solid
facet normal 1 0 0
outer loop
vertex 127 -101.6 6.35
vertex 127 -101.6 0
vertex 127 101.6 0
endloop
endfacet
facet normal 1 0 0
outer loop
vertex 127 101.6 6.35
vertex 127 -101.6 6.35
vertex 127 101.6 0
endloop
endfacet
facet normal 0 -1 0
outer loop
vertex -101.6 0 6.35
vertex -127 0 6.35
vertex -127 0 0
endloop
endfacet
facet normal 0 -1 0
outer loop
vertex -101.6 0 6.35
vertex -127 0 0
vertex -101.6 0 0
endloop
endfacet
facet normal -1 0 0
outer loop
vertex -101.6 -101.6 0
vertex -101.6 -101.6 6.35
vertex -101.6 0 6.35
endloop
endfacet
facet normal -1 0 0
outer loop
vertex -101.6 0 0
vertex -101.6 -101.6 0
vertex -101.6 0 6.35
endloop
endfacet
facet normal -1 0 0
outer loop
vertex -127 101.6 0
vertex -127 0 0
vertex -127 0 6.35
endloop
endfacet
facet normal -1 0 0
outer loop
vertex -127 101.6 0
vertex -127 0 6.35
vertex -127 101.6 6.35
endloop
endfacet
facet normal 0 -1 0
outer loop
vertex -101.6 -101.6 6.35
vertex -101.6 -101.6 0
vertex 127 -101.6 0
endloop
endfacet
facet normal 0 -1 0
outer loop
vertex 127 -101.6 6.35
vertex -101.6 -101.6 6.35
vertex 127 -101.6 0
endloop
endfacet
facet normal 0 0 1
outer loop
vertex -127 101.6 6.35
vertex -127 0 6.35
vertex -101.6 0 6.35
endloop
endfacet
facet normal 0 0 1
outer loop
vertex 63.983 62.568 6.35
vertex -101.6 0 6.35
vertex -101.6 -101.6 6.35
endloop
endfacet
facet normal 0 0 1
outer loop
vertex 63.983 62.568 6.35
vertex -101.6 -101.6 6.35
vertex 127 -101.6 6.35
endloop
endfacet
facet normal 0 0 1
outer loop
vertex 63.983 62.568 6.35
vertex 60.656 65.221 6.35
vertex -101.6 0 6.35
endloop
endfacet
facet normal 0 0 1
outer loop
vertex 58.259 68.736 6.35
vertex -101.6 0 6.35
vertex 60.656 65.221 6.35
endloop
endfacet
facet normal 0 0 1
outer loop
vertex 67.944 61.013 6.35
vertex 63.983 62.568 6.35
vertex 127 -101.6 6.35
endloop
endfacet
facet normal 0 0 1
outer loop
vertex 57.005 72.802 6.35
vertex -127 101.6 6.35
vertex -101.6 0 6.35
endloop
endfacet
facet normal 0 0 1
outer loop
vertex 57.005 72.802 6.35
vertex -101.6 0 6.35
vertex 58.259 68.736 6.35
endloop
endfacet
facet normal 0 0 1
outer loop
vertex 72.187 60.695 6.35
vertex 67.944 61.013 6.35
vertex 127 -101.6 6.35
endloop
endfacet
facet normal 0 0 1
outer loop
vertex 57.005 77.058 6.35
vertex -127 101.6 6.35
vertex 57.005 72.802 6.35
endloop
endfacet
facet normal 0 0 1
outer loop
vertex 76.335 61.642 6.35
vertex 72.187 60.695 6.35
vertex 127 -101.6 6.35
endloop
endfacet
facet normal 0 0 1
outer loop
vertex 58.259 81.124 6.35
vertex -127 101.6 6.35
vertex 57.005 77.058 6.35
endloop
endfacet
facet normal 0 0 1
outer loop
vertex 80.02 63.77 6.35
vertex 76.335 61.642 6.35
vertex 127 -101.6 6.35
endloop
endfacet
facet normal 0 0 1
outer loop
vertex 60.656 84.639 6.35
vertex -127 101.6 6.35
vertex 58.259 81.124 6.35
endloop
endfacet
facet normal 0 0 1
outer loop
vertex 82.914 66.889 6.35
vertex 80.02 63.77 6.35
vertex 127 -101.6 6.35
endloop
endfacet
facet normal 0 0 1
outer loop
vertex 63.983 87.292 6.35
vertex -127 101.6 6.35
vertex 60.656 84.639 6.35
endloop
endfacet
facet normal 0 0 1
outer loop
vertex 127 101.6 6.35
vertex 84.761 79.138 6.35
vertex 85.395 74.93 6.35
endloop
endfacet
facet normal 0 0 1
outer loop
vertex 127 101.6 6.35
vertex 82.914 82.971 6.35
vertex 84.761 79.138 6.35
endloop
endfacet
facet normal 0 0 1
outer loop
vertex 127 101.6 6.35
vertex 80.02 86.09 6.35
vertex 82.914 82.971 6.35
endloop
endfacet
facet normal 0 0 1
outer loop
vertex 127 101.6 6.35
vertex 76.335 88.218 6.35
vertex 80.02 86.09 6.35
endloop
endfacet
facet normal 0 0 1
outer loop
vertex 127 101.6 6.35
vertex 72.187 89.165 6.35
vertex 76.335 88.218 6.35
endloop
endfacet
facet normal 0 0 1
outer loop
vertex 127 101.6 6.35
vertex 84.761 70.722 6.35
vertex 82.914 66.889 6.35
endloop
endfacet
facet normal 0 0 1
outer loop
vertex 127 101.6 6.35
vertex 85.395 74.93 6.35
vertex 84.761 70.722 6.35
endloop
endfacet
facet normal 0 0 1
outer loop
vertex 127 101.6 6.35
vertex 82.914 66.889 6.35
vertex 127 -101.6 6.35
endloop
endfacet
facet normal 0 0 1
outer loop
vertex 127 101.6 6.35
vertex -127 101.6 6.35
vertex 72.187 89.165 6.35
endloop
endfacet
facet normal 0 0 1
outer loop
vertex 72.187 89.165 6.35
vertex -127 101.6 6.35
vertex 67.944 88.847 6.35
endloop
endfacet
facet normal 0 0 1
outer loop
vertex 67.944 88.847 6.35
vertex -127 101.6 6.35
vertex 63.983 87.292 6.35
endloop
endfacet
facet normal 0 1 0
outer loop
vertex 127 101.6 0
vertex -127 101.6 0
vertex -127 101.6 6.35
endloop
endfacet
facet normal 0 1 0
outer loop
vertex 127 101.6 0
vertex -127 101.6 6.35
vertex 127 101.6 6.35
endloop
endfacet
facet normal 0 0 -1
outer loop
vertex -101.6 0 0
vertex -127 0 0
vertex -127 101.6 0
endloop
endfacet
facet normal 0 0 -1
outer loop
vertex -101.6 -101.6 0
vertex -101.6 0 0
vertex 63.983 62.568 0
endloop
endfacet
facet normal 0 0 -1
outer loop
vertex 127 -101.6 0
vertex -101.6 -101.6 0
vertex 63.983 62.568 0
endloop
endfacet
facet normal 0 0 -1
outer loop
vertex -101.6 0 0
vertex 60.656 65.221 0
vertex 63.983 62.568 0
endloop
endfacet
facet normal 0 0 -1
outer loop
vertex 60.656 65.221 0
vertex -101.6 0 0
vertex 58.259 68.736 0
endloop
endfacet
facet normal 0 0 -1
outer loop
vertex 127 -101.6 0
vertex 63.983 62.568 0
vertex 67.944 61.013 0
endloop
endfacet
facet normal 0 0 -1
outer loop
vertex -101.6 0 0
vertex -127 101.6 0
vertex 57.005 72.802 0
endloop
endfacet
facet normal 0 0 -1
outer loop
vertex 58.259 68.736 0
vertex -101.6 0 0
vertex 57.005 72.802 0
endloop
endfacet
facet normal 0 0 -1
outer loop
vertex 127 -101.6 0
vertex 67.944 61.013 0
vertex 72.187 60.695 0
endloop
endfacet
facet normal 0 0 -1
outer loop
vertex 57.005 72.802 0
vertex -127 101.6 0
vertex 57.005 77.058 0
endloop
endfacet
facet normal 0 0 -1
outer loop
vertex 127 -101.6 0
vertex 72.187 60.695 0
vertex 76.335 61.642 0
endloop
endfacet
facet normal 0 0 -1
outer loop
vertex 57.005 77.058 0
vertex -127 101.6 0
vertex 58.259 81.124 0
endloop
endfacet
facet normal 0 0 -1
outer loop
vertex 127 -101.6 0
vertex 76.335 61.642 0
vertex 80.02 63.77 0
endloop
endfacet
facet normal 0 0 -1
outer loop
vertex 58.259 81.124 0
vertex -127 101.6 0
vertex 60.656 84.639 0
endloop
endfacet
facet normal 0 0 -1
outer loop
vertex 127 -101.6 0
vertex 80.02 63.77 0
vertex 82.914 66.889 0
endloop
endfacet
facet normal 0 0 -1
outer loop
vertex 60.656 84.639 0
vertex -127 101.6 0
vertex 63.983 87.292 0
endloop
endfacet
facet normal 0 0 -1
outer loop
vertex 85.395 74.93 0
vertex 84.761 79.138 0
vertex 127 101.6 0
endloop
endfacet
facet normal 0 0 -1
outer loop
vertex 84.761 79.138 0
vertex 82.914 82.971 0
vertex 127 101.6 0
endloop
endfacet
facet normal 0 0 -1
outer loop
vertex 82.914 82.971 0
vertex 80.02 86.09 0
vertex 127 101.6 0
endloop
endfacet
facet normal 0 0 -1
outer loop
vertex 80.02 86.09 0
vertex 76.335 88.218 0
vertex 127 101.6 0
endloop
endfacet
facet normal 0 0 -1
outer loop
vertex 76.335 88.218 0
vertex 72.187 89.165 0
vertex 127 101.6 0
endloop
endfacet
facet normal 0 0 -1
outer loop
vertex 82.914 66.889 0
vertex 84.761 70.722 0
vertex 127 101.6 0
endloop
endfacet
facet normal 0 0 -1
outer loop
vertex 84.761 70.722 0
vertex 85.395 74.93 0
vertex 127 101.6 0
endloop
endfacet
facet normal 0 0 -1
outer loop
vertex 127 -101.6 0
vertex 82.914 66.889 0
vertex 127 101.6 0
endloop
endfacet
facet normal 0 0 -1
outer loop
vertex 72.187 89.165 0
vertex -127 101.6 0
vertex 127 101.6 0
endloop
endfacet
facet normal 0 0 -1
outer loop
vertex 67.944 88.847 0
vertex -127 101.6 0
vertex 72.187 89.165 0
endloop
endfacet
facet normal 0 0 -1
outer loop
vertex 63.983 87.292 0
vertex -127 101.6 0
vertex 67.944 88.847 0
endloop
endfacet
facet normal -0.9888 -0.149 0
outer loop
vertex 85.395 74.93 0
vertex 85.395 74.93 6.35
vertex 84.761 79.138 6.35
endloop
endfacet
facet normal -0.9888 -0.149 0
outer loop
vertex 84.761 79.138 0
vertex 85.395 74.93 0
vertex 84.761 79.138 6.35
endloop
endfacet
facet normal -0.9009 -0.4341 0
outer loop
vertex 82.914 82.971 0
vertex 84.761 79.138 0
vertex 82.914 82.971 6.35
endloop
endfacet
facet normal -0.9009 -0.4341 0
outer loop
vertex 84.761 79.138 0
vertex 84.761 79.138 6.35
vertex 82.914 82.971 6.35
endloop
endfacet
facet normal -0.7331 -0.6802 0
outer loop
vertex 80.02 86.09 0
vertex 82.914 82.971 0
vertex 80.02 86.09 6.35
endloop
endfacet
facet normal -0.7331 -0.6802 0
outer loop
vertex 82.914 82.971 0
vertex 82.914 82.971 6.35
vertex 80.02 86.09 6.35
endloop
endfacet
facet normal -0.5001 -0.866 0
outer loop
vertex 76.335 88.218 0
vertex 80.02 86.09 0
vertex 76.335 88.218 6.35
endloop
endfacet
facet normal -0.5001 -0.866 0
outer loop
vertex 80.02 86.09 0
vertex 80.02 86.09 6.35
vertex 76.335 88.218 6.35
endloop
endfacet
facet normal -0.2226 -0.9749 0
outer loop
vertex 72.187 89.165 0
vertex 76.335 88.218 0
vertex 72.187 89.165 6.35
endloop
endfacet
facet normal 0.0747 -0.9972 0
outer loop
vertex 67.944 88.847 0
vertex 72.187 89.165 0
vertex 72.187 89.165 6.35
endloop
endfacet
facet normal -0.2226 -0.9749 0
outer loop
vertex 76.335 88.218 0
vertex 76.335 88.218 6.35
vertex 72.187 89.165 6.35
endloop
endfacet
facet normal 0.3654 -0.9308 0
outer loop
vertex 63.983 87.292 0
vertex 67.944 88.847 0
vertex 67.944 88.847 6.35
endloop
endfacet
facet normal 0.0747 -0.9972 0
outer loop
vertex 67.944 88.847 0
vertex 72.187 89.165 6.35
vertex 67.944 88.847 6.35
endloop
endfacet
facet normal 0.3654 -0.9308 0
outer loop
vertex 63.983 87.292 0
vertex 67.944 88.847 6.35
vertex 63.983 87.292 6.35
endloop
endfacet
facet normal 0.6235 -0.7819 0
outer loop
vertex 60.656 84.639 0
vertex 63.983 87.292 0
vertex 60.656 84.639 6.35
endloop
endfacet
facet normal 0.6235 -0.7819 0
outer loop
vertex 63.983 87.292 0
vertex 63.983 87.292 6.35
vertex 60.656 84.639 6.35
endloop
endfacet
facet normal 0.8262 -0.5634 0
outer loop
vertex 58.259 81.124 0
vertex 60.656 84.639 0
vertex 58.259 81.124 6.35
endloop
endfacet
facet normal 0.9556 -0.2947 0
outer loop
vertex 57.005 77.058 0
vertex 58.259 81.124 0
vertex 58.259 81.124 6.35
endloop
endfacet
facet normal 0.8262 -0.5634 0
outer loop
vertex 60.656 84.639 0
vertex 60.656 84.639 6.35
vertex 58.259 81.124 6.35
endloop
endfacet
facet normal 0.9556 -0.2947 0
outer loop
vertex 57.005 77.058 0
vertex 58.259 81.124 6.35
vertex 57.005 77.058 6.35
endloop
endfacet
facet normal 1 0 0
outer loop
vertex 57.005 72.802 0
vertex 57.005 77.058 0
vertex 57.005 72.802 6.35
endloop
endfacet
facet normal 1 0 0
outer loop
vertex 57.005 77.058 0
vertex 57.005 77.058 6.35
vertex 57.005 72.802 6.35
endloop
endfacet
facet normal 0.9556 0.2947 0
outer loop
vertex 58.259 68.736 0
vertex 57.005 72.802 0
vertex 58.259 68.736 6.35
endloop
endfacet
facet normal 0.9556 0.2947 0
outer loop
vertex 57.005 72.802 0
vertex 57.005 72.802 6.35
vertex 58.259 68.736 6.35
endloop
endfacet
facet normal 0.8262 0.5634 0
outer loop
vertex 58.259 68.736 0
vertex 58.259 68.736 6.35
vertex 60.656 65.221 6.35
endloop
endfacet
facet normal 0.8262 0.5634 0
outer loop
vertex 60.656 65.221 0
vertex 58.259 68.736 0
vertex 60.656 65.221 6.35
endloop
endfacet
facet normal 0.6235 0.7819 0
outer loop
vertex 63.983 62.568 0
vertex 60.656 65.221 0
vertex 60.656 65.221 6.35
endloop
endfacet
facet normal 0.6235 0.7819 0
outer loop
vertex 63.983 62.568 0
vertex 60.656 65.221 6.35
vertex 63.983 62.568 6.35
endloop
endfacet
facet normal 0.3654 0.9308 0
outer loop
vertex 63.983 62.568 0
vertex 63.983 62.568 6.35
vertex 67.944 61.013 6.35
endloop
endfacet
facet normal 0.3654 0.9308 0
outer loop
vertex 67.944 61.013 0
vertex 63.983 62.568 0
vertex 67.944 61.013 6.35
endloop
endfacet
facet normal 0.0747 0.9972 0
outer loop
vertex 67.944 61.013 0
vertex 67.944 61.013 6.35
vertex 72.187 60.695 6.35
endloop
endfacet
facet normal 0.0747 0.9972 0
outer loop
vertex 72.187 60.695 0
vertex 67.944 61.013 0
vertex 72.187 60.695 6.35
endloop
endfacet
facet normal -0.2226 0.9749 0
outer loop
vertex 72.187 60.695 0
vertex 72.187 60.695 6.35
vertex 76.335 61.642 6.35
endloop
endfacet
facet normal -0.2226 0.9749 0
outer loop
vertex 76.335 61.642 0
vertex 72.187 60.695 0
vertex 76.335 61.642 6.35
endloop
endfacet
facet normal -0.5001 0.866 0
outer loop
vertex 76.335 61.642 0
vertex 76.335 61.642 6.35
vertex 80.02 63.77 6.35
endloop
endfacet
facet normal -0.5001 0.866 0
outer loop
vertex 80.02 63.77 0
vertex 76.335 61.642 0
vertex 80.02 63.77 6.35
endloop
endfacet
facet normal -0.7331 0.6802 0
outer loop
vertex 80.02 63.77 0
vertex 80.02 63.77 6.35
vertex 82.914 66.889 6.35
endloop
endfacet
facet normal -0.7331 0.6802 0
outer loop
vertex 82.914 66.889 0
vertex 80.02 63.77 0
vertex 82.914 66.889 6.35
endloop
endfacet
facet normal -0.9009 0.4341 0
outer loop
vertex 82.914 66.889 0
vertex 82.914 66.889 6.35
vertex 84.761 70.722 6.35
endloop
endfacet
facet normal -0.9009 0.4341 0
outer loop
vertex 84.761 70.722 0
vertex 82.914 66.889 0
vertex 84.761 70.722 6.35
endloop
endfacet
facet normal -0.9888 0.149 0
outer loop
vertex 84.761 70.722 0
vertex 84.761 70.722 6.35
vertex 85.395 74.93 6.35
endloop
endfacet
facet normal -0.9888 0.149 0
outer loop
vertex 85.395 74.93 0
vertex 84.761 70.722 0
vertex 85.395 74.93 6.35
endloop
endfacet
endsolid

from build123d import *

# Parameters (mm, degrees)
SKETCH1_W           = 254
SKETCH1_H           = 203.2
BOSS_EXTRUDE1_DEPTH = 6.35
SKETCH2_R           = 14.2748
SKETCH2_W           = 25.4
SKETCH2_H           = 101.6
CUT_EXTRUDE1_DEPTH  = 163.763271348


with BuildPart() as part:
    # Sketch1 → Boss-Extrude1 (new body)
    with BuildSketch(Plane.XY):
        Rectangle(SKETCH1_W, SKETCH1_H)
    extrude(amount=BOSS_EXTRUDE1_DEPTH)

    # Sketch2 → Cut-Extrude1 (cut, through all)
    with BuildSketch(Plane.XY.offset(6.35)):
        with Locations((71.12, 74.93)):
            Circle(SKETCH2_R)
        with Locations((-114.3, -50.8)):
            Rectangle(SKETCH2_W, SKETCH2_H)
    extrude(amount=-CUT_EXTRUDE1_DEPTH, mode=Mode.SUBTRACT)


solid = part.part
